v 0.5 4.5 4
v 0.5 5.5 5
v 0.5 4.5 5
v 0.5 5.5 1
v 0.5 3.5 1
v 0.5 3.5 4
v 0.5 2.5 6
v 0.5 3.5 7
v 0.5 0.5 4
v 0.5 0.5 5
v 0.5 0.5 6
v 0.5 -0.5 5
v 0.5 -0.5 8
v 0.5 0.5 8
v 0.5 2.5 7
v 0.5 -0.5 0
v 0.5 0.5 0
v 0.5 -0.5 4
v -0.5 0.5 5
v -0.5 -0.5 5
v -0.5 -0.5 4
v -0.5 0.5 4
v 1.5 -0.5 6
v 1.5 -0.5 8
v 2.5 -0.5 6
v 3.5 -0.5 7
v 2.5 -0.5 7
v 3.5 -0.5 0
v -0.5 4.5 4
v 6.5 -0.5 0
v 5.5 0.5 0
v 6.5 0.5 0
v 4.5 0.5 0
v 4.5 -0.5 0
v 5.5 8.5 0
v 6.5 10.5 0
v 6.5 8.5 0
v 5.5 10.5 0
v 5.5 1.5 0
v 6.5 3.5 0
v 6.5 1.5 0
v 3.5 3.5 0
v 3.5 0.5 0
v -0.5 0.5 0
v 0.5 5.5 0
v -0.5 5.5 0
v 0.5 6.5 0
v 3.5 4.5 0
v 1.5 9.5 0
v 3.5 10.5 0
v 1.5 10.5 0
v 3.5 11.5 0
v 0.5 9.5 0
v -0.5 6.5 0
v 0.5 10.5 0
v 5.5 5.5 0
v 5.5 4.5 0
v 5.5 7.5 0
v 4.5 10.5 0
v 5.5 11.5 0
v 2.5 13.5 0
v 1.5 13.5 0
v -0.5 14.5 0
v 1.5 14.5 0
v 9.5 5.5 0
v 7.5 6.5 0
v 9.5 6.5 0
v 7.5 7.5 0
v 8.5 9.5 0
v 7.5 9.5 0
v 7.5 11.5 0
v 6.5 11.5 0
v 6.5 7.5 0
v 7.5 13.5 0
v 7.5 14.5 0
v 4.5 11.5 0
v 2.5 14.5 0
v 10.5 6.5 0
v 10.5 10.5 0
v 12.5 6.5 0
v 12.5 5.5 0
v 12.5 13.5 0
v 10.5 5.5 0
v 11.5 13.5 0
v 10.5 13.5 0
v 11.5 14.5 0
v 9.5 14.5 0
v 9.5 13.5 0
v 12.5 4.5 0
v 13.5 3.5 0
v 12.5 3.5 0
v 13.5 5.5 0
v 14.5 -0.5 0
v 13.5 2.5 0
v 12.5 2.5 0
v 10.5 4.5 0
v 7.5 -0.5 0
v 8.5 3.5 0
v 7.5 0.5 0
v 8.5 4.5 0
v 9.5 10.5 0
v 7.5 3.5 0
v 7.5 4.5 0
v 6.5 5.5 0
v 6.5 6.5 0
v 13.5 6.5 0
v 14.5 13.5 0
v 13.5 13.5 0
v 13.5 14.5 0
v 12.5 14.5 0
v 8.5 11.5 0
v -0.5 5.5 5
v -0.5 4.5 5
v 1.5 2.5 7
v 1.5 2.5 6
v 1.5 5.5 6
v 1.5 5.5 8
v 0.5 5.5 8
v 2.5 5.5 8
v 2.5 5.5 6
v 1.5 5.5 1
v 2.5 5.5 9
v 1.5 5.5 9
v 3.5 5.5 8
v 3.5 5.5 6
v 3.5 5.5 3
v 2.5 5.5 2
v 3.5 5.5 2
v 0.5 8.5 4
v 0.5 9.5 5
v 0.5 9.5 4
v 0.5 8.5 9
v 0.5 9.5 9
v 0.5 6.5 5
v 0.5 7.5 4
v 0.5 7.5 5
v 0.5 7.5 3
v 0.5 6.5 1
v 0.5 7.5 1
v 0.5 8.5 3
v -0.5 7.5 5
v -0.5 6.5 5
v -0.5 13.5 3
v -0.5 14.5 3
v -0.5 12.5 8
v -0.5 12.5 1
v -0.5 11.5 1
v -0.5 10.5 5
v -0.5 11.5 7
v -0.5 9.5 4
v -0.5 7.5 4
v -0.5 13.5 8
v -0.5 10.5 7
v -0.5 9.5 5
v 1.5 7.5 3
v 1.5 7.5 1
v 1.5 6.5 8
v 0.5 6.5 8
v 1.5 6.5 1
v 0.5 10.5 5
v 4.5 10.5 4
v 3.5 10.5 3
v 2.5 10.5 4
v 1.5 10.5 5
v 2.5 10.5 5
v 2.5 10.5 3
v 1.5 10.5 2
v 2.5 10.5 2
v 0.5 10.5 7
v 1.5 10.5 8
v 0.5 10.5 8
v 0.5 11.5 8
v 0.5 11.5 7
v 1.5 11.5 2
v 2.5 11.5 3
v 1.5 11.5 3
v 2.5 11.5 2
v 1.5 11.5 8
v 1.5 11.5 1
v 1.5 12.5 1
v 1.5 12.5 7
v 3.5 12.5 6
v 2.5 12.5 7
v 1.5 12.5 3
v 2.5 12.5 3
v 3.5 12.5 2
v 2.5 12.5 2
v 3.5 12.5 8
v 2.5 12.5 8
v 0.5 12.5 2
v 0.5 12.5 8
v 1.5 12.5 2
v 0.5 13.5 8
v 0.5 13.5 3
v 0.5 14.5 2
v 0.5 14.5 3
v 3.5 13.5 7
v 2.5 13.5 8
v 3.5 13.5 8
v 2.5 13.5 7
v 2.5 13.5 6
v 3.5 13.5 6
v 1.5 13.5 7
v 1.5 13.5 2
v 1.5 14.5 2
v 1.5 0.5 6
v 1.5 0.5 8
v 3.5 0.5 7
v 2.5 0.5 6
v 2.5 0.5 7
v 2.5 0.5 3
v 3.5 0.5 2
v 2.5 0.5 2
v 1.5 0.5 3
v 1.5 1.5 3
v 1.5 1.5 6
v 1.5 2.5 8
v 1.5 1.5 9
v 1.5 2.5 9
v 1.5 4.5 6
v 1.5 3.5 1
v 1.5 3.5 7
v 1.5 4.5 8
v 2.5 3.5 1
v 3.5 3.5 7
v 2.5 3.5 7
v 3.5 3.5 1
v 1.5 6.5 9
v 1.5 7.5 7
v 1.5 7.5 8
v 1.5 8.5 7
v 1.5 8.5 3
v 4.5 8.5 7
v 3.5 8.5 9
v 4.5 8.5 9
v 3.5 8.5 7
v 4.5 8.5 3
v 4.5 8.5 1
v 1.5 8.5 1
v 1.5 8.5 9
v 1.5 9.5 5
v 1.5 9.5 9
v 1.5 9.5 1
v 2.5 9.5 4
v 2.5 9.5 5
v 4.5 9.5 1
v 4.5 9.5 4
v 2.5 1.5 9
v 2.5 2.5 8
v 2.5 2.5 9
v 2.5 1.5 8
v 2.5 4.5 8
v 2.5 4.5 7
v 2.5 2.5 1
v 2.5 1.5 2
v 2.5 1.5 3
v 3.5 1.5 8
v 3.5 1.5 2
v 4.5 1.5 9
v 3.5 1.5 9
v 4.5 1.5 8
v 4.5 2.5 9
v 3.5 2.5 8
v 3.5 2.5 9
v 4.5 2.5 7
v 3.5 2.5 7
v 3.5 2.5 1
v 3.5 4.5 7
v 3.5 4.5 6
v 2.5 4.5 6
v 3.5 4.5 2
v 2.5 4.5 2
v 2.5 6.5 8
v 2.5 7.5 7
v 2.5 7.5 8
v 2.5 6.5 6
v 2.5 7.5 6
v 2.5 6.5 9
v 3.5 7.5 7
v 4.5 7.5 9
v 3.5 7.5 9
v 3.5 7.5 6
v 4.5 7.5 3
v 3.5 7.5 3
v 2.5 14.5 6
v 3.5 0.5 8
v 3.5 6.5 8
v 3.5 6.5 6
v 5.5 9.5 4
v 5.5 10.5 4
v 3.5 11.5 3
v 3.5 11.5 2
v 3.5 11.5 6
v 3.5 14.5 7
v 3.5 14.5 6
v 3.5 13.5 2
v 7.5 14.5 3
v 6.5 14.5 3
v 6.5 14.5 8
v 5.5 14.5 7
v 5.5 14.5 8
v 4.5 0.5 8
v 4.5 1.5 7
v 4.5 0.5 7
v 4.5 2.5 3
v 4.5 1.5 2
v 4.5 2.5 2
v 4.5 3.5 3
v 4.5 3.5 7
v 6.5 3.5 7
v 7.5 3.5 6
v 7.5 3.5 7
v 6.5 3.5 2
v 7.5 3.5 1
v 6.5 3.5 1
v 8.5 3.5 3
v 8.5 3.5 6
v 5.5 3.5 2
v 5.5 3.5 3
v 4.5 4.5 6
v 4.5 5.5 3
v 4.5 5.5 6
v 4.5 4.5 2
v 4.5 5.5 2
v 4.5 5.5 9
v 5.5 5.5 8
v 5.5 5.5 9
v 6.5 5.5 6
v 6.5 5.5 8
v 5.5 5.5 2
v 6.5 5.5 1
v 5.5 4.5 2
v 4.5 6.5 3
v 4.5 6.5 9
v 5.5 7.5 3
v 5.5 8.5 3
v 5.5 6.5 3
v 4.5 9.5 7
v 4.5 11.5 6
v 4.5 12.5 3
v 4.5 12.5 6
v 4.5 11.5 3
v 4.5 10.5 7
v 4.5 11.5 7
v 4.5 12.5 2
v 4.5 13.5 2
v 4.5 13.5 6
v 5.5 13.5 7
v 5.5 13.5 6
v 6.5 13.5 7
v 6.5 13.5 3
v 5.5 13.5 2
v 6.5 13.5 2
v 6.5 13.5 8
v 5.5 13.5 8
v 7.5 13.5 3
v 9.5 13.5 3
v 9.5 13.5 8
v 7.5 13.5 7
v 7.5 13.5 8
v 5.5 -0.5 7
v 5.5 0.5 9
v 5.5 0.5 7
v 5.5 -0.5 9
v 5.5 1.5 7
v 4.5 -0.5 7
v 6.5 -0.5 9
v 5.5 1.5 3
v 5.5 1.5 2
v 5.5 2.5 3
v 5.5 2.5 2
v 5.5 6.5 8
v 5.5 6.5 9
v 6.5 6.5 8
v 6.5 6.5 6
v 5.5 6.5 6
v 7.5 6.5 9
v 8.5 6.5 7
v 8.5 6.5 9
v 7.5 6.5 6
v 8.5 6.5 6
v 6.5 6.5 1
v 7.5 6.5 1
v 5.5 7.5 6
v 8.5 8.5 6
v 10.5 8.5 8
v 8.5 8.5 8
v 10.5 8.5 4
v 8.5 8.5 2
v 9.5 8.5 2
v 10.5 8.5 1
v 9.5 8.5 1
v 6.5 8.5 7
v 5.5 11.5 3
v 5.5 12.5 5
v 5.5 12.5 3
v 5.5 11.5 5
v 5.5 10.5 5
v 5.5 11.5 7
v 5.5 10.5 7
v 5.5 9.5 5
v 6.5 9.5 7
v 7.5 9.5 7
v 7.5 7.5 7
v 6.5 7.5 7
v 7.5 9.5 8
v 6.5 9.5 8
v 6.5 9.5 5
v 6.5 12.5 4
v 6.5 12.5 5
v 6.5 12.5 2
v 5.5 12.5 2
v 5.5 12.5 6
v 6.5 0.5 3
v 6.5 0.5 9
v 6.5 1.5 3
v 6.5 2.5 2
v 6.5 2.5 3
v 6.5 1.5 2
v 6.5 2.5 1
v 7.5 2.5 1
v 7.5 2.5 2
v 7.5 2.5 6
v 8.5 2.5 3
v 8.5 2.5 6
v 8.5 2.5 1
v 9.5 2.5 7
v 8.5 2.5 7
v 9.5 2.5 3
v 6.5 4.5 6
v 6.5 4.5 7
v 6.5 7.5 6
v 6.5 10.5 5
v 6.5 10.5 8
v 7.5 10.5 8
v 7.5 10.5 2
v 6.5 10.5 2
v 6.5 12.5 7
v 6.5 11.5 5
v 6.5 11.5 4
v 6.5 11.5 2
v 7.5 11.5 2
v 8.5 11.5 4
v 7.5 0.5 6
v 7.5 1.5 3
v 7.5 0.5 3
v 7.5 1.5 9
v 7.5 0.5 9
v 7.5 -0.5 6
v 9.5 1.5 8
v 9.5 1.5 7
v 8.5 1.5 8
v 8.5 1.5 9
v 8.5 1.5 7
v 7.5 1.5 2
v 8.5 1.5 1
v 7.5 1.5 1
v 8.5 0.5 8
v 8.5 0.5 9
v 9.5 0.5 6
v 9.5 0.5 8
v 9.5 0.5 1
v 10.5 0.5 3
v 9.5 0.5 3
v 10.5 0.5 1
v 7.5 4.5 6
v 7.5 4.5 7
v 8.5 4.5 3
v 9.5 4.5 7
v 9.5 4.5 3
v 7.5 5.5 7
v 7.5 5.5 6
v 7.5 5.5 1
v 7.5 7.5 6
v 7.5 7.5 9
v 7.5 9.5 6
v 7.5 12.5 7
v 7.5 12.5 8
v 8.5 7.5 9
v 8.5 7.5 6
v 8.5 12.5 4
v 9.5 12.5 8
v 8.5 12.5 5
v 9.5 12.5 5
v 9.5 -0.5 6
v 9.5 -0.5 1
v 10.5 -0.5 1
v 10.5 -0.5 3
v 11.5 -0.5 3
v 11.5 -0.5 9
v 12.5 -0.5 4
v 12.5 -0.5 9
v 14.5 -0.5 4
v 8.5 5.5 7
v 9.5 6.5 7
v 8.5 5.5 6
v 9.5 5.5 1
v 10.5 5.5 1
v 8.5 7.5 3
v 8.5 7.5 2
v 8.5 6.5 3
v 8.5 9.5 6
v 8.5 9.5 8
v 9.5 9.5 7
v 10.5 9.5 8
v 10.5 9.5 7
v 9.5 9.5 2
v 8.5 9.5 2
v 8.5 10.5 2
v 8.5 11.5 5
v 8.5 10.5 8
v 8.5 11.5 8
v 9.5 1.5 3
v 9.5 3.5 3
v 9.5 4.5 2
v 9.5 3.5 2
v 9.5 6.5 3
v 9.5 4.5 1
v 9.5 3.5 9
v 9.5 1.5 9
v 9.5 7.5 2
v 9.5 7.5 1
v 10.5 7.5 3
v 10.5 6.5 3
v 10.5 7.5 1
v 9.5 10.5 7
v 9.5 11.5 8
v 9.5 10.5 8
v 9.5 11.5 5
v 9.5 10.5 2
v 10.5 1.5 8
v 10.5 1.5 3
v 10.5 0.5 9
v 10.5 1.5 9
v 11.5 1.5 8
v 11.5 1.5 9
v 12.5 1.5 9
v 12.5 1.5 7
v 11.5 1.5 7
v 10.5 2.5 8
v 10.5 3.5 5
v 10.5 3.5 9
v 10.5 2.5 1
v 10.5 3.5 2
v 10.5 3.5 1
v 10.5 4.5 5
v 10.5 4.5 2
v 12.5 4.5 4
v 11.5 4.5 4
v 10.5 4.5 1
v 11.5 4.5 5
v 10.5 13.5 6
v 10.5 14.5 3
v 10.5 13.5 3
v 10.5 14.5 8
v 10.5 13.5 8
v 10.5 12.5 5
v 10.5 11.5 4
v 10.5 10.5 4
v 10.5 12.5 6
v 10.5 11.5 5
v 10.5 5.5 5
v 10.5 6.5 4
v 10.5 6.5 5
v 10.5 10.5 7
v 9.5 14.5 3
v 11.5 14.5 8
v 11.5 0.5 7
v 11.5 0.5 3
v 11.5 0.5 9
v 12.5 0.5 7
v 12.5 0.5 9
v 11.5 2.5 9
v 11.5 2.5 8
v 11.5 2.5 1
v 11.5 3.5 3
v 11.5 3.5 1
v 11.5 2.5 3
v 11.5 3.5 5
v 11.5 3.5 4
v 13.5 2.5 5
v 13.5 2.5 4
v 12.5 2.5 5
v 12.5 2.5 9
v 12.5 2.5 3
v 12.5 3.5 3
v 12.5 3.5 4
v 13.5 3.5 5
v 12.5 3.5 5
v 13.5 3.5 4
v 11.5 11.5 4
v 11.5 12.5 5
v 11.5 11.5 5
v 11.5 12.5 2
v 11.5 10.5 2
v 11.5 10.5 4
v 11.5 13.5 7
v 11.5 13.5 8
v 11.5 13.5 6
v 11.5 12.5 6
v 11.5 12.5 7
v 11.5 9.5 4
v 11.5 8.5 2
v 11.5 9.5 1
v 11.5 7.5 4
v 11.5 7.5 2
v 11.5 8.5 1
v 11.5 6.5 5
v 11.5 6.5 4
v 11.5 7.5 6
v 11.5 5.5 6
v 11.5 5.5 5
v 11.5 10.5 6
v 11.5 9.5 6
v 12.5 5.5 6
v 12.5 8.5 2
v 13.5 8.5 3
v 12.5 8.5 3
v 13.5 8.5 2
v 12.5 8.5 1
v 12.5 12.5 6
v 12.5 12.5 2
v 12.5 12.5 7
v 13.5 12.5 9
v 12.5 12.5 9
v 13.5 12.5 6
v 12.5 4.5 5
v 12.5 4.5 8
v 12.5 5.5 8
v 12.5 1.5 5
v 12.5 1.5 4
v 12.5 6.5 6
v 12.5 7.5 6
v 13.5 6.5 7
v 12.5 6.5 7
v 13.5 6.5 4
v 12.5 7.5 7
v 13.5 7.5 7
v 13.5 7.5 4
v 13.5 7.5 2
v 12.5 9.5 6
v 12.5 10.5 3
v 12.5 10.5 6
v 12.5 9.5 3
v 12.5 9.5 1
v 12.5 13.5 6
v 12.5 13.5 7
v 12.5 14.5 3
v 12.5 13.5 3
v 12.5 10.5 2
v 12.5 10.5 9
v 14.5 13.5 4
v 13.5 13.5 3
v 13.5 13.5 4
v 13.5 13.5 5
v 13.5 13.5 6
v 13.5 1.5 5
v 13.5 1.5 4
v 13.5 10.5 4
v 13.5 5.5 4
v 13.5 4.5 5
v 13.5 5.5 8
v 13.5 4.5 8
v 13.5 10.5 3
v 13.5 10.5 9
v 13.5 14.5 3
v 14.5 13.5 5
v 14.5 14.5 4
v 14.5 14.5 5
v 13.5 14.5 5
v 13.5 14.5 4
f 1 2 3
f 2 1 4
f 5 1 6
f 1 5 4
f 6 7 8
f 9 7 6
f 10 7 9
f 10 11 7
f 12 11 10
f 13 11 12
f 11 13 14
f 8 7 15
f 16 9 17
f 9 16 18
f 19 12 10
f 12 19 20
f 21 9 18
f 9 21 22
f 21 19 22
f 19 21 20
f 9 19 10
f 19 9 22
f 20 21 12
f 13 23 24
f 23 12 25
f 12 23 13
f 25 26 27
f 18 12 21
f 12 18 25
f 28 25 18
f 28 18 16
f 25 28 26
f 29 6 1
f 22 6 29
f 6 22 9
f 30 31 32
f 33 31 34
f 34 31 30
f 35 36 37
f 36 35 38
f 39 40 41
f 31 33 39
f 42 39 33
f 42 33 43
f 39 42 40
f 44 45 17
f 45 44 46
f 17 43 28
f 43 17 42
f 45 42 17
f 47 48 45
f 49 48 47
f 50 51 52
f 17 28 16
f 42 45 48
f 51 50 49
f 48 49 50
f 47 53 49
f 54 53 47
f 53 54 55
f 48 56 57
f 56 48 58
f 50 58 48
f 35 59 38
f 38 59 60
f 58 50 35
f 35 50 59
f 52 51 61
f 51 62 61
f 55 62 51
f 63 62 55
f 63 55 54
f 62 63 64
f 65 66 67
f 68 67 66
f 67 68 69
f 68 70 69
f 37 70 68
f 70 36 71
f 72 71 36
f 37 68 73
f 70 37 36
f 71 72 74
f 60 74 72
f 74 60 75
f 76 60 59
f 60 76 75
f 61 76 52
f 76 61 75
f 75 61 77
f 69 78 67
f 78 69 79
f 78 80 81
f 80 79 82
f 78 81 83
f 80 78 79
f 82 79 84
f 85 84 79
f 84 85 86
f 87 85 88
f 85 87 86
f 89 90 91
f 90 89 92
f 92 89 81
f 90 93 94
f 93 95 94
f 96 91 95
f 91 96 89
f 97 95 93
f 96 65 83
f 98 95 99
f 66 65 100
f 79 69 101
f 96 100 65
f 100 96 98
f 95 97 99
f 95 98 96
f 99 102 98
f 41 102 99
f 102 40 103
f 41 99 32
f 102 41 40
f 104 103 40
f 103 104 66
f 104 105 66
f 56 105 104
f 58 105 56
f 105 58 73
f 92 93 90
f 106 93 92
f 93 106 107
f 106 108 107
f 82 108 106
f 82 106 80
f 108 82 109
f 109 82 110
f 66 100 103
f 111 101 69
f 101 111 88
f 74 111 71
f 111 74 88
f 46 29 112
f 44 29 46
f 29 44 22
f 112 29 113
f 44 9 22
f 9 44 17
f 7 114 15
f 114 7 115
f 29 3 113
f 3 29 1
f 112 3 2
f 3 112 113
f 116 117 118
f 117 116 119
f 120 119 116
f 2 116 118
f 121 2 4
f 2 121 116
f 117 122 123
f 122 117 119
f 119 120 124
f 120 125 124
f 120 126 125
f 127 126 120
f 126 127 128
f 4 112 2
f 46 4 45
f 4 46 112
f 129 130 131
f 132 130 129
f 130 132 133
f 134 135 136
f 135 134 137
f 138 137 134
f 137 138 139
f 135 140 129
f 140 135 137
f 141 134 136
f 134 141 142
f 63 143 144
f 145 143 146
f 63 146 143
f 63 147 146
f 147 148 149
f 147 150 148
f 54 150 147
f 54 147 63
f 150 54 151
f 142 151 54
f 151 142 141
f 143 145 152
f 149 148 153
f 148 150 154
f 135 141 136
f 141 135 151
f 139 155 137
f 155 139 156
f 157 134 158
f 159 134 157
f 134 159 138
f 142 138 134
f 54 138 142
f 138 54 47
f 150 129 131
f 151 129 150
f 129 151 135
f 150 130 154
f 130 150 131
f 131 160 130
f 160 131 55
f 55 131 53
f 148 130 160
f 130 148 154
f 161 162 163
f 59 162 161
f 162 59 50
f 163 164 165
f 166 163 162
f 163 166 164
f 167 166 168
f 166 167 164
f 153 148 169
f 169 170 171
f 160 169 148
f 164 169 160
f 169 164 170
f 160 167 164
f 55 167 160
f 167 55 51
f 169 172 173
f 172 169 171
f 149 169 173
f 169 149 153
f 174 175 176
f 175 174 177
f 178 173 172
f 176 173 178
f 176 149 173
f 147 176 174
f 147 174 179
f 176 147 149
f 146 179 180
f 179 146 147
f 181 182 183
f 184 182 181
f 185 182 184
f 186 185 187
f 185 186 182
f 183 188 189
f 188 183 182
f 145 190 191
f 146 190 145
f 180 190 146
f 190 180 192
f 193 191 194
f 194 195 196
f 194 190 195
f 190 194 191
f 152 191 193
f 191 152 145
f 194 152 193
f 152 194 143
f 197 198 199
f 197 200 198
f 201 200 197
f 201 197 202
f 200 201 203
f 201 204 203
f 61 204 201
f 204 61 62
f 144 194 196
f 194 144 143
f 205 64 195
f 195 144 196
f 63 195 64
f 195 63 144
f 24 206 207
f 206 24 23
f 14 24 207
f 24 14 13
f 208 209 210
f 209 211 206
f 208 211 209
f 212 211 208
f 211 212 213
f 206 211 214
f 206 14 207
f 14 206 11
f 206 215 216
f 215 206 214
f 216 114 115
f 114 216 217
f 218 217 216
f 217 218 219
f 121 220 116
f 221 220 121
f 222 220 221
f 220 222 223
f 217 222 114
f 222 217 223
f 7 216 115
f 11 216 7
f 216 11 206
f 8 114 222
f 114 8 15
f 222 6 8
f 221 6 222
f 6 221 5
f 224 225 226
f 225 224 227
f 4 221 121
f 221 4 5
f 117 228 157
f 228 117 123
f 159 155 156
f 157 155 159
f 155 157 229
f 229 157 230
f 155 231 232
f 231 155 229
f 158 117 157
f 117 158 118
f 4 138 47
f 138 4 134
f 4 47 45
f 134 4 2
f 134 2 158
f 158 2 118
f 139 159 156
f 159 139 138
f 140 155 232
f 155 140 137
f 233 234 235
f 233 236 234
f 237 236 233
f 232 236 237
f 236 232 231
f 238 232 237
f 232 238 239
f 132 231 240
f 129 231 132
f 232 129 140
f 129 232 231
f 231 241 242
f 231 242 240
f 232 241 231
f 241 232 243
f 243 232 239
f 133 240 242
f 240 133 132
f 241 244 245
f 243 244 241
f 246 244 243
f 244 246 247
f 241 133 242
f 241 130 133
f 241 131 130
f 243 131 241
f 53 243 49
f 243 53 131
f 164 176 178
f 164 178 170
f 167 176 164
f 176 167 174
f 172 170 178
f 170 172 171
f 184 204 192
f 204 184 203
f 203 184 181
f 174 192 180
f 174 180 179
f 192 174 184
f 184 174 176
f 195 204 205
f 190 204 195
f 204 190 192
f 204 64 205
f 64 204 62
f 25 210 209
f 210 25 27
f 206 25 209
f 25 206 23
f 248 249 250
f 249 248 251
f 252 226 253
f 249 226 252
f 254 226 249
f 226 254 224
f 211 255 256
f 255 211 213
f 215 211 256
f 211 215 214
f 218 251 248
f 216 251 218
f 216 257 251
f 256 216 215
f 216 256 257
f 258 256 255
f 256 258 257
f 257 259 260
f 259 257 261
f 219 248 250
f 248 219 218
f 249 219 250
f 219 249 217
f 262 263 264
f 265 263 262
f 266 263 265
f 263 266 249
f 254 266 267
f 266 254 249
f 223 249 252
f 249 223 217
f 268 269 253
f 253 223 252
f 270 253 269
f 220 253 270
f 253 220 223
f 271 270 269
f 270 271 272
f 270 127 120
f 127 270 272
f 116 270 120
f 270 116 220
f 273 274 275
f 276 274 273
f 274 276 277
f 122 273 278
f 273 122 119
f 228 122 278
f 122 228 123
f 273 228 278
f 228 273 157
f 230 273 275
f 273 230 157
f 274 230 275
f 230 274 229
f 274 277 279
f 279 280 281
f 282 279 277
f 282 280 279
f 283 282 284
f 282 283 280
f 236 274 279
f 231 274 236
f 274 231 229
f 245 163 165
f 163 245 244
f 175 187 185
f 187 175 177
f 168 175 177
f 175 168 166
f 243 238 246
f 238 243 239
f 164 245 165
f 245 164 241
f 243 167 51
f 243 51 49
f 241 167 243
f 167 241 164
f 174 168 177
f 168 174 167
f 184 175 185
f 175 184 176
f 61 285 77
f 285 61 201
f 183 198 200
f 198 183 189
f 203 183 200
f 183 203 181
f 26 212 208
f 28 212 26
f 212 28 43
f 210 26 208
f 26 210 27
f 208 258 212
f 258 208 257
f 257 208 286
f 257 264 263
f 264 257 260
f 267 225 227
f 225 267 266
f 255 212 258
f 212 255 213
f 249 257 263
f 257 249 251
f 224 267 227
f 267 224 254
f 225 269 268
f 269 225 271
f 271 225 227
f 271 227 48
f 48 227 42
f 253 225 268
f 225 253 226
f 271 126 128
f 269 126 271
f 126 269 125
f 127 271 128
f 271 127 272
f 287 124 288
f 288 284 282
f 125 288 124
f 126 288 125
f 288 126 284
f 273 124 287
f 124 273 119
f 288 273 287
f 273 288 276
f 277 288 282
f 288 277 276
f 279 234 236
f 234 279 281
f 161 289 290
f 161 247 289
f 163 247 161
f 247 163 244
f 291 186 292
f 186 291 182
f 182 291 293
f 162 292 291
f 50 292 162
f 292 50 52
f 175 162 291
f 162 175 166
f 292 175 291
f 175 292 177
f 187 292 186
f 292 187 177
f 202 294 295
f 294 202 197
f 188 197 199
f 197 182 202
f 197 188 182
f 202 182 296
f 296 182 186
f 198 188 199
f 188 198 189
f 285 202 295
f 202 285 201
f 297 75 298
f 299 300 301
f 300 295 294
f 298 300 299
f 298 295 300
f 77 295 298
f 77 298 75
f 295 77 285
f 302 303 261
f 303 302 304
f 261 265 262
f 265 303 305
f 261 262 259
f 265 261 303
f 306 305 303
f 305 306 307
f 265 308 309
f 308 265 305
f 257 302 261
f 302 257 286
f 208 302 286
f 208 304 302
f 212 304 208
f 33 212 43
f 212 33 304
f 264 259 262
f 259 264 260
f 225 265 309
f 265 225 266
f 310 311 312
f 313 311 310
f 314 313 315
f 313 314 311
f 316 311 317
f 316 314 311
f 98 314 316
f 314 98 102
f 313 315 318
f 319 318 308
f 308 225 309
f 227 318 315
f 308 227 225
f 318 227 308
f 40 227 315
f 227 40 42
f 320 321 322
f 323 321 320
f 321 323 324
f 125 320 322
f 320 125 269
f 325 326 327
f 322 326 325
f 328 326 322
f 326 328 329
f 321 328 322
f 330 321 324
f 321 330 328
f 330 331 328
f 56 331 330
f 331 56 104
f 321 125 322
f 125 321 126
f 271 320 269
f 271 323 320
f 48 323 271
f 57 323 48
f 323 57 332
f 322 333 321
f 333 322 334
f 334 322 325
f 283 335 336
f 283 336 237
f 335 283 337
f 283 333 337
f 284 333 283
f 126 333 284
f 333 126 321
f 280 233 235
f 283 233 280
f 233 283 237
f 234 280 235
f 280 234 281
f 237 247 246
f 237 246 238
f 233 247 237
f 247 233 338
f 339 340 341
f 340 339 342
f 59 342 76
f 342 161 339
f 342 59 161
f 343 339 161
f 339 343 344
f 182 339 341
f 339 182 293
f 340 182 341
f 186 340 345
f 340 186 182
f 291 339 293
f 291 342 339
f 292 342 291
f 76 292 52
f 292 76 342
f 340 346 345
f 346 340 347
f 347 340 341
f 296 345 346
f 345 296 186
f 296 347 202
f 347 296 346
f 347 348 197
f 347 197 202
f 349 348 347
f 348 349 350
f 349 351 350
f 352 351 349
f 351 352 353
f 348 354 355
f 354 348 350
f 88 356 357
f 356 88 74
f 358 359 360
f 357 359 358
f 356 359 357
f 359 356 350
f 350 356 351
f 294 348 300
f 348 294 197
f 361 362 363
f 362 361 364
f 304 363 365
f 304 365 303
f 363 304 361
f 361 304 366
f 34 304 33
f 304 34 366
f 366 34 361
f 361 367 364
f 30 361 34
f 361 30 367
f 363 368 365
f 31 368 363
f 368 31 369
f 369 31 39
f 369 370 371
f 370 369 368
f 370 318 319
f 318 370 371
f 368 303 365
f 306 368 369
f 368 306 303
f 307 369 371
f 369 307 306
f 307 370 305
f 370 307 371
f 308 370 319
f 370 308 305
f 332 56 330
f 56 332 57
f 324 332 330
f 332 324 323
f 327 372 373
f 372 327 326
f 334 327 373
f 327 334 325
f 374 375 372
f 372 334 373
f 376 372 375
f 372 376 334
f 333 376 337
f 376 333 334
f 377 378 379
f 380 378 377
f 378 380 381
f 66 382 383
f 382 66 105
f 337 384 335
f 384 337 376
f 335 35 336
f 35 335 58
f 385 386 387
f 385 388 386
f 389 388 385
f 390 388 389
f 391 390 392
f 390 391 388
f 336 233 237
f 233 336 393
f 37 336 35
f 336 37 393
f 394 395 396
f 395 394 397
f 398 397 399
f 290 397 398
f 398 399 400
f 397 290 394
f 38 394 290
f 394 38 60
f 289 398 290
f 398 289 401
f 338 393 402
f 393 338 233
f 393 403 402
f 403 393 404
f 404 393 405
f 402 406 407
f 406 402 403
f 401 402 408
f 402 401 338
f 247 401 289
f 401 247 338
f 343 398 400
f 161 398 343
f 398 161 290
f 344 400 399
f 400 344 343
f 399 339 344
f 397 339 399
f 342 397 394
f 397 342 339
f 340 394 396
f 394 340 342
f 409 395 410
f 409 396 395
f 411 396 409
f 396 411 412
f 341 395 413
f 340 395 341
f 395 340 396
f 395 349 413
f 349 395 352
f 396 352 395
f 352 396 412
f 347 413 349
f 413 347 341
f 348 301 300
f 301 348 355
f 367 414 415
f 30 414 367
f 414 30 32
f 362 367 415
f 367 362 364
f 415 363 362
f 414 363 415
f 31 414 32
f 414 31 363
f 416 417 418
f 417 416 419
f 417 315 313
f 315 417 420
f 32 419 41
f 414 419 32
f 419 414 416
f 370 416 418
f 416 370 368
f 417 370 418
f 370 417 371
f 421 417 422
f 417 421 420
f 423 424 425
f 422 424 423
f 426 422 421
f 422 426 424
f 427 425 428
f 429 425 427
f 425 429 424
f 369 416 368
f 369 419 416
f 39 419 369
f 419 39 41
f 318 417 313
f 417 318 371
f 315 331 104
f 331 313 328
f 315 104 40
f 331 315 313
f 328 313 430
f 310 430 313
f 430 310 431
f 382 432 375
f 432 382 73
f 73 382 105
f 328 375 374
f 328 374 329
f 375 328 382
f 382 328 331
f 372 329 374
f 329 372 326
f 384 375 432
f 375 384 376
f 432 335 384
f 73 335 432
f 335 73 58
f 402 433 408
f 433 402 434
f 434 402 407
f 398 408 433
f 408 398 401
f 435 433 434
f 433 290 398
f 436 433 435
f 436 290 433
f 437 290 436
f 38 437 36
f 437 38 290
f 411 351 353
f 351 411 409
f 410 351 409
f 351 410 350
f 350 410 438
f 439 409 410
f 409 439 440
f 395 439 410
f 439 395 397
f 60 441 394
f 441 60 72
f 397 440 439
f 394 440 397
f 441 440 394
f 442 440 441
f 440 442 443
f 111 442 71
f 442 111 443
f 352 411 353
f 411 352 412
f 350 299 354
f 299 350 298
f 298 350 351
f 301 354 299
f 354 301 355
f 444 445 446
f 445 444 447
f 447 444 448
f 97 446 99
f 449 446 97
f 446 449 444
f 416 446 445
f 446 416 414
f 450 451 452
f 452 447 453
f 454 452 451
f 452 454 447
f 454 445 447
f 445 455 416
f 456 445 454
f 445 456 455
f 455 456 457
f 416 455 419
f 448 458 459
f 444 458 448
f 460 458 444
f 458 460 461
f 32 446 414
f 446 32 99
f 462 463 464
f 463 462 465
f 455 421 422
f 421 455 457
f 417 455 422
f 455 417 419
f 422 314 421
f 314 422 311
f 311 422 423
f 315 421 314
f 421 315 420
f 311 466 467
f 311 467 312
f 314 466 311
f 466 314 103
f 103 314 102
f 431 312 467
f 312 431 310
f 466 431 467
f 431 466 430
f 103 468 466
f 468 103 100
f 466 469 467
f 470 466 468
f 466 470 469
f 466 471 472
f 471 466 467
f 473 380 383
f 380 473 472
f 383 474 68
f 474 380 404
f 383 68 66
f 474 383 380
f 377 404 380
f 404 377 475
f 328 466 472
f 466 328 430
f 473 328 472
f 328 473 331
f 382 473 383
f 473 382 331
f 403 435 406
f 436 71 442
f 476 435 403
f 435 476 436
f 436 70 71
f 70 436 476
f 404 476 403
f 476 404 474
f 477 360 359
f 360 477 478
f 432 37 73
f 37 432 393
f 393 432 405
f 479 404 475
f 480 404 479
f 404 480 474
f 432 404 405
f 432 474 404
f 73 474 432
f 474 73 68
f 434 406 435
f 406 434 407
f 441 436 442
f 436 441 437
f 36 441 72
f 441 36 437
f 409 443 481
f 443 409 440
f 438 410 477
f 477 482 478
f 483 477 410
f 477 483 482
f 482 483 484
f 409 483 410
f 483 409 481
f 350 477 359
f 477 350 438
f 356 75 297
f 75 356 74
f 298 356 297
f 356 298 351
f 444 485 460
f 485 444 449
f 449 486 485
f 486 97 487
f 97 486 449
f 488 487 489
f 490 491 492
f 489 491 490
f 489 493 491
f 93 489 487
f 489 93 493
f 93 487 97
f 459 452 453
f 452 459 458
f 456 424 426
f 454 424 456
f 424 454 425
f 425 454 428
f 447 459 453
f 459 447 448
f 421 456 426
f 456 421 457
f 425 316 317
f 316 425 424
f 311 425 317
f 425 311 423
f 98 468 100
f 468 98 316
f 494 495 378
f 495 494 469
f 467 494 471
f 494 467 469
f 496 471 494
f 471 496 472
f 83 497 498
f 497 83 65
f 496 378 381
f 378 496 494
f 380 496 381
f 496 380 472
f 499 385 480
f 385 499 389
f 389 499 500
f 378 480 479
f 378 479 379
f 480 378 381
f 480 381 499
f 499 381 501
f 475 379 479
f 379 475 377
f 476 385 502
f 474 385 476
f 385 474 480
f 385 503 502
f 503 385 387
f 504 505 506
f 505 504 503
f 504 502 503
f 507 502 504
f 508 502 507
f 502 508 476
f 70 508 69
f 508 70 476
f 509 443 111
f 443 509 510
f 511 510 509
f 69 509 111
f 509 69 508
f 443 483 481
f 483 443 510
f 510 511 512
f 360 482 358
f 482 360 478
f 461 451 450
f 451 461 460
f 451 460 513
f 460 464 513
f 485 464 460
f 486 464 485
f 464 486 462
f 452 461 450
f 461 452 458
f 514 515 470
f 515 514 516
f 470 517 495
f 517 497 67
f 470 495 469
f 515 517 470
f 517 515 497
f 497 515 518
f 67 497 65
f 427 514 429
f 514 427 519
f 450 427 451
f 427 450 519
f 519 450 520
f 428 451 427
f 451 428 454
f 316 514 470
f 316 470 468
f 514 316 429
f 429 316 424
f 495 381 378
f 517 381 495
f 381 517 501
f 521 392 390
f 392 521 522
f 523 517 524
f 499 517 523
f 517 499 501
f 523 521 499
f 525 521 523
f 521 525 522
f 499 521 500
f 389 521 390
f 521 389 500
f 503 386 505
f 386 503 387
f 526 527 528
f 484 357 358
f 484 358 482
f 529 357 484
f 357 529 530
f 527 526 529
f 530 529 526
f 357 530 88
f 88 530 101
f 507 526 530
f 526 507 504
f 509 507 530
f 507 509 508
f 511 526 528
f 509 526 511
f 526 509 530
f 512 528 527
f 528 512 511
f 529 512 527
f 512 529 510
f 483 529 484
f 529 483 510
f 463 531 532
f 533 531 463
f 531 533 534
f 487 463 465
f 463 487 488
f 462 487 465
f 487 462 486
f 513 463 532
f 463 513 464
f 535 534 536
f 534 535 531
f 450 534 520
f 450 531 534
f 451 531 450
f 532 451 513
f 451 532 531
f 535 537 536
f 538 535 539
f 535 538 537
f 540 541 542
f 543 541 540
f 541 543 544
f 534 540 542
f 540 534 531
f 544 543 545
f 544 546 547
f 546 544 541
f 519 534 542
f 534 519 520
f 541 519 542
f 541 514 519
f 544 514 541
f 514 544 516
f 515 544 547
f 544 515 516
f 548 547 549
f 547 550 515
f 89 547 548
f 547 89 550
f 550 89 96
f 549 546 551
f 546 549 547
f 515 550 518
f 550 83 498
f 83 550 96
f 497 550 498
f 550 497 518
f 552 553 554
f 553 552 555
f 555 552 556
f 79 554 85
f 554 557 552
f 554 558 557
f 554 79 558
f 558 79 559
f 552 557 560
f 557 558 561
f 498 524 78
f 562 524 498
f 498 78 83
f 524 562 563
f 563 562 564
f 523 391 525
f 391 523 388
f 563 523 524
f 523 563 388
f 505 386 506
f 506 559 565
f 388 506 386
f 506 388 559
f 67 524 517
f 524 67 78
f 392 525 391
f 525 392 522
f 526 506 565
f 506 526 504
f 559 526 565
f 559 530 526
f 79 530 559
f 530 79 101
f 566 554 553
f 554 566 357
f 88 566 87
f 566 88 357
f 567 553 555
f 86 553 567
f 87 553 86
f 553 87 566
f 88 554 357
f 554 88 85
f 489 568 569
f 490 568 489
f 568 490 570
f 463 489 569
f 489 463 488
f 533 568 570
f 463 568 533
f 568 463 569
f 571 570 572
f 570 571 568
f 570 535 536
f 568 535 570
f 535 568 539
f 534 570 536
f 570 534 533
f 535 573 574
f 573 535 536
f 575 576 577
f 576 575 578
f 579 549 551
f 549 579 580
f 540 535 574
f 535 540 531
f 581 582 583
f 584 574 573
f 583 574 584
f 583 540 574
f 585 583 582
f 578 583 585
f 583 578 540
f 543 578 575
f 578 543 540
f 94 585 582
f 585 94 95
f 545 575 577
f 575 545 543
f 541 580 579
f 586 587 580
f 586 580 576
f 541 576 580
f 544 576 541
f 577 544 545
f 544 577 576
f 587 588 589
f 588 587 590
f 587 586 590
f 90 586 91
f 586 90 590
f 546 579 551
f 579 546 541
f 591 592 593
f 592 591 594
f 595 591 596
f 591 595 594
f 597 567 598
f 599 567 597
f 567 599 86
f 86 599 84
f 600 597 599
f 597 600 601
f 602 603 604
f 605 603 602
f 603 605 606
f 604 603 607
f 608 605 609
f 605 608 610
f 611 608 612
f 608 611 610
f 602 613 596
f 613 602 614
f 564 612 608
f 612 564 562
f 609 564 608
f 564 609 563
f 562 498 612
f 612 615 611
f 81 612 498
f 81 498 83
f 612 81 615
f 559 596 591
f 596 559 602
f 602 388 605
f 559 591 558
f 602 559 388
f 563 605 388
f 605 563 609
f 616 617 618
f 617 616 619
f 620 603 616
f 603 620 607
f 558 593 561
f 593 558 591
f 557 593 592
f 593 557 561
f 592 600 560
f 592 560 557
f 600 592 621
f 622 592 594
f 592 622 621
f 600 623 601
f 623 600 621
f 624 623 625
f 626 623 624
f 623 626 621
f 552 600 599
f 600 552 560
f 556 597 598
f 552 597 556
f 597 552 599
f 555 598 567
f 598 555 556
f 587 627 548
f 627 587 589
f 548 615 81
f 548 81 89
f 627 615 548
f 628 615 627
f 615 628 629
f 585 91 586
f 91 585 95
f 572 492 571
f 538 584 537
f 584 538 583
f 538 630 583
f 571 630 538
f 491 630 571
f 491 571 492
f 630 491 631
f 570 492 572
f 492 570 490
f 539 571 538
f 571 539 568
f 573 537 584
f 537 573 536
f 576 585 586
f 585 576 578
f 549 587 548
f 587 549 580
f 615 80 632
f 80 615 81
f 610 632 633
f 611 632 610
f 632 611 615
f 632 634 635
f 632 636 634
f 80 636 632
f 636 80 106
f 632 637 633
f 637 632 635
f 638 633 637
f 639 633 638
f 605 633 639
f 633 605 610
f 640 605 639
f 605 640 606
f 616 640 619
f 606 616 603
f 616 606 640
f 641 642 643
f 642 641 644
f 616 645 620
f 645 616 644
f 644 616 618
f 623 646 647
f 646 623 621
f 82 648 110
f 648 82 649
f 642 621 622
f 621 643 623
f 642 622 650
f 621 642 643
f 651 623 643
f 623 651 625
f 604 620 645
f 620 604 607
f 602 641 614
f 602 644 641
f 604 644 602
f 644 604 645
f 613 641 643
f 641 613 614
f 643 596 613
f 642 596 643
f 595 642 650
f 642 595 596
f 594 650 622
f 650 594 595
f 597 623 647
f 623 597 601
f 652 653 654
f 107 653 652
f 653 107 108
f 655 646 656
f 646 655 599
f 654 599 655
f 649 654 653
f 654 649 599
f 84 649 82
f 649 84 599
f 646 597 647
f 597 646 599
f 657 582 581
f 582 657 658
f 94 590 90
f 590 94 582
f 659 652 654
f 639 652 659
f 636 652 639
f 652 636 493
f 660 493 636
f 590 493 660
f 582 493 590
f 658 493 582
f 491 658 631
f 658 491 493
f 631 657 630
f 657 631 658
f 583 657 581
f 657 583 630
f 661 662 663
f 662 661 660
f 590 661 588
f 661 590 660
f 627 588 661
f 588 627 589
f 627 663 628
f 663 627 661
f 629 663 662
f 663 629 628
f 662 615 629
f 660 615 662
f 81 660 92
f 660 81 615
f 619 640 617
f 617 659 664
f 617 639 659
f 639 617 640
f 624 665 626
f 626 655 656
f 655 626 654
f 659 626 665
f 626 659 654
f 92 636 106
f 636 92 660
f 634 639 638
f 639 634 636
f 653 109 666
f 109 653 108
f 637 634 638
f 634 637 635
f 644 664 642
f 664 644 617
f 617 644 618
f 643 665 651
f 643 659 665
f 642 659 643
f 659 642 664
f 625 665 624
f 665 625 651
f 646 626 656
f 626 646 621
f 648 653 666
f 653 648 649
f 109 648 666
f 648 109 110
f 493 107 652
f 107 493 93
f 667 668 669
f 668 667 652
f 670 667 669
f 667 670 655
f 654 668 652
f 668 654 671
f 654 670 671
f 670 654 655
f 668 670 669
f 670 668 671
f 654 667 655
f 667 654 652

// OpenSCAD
union() {
    translate([0, 0, 4.5]) color([1, 0, 0]) cube([1, 1, 1], center=true);
    translate([0, 1, 2.0]) cube([1, 1, 4], center=true);
    translate([0, 2, 2.0]) cube([1, 1, 4], center=true);
    translate([0, 3, 2.0]) cube([1, 1, 4], center=true);
    translate([0, 4, 2.0]) cube([1, 1, 4], center=true);
    translate([0, 5, 2.5]) cube([1, 1, 5], center=true);
    translate([0, 7, 2.5]) cube([1, 1, 5], center=true);
    translate([0, 8, 2.0]) cube([1, 1, 4], center=true);
    translate([0, 9, 2.0]) cube([1, 1, 4], center=true);
    translate([0, 10, 2.5]) cube([1, 1, 5], center=true);
    translate([0, 11, 3.5]) cube([1, 1, 7], center=true);
    translate([0, 12, 0.5]) cube([1, 1, 1], center=true);
    translate([0, 13, 4.0]) cube([1, 1, 8], center=true);
    translate([0, 14, 1.5]) cube([1, 1, 3], center=true);
    translate([1, 0, 4.0]) cube([1, 1, 8], center=true);
    translate([1, 1, 3.0]) cube([1, 1, 6], center=true);
    translate([1, 2, 3.0]) cube([1, 1, 6], center=true);
    translate([1, 3, 3.5]) cube([1, 1, 7], center=true);
    translate([1, 4, 0.5]) cube([1, 1, 1], center=true);
    translate([1, 5, 0.5]) cube([1, 1, 1], center=true);
    translate([1, 6, 4.0]) cube([1, 1, 8], center=true);
    translate([1, 7, 0.5]) cube([1, 1, 1], center=true);
    translate([1, 8, 1.5]) cube([1, 1, 3], center=true);
    translate([1, 9, 4.5]) cube([1, 1, 9], center=true);
    translate([1, 11, 4.0]) cube([1, 1, 8], center=true);
    translate([1, 12, 0.5]) cube([1, 1, 1], center=true);
    translate([1, 13, 1.0]) cube([1, 1, 2], center=true);
    translate([1, 14, 1.0]) cube([1, 1, 2], center=true);
    translate([2, 0, 3.0]) cube([1, 1, 6], center=true);
    translate([2, 1, 1.5]) cube([1, 1, 3], center=true);
    translate([2, 2, 4.5]) cube([1, 1, 9], center=true);
    translate([2, 3, 4.0]) cube([1, 1, 8], center=true);
    translate([2, 4, 4.0]) cube([1, 1, 8], center=true);
    translate([2, 5, 3.0]) cube([1, 1, 6], center=true);
    translate([2, 6, 4.5]) cube([1, 1, 9], center=true);
    translate([2, 7, 4.0]) cube([1, 1, 8], center=true);
    translate([2, 8, 3.5]) cube([1, 1, 7], center=true);
    translate([2, 9, 0.5]) cube([1, 1, 1], center=true);
    translate([2, 10, 2.5]) cube([1, 1, 5], center=true);
    translate([2, 11, 1.0]) cube([1, 1, 2], center=true);
    translate([2, 12, 1.5]) cube([1, 1, 3], center=true);
    translate([2, 13, 3.5]) cube([1, 1, 7], center=true);
    translate([3, 0, 3.5]) cube([1, 1, 7], center=true);
    translate([3, 1, 1.0]) cube([1, 1, 2], center=true);
    translate([3, 2, 4.0]) cube([1, 1, 8], center=true);
    translate([3, 3, 0.5]) cube([1, 1, 1], center=true);
    translate([3, 4, 3.5]) cube([1, 1, 7], center=true);
    translate([3, 5, 1.0]) cube([1, 1, 2], center=true);
    translate([3, 6, 4.0]) cube([1, 1, 8], center=true);
    translate([3, 7, 3.0]) cube([1, 1, 6], center=true);
    translate([3, 8, 3.5]) cube([1, 1, 7], center=true);
    translate([3, 9, 0.5]) cube([1, 1, 1], center=true);
    translate([3, 10, 2.0]) cube([1, 1, 4], center=true);
    translate([3, 11, 1.5]) cube([1, 1, 3], center=true);
    translate([3, 12, 1.0]) cube([1, 1, 2], center=true);
    translate([3, 13, 4.0]) cube([1, 1, 8], center=true);
    translate([3, 14, 3.0]) cube([1, 1, 6], center=true);
    translate([4, 1, 4.0]) cube([1, 1, 8], center=true);
    translate([4, 2, 4.5]) cube([1, 1, 9], center=true);
    translate([4, 3, 3.5]) cube([1, 1, 7], center=true);
    translate([4, 5, 3.0]) cube([1, 1, 6], center=true);
    translate([4, 6, 1.5]) cube([1, 1, 3], center=true);
    translate([4, 7, 1.5]) cube([1, 1, 3], center=true);
    translate([4, 8, 4.5]) cube([1, 1, 9], center=true);
    translate([4, 9, 0.5]) cube([1, 1, 1], center=true);
    translate([4, 10, 2.0]) cube([1, 1, 4], center=true);
    translate([4, 12, 3.0]) cube([1, 1, 6], center=true);
    translate([4, 13, 1.0]) cube([1, 1, 2], center=true);
    translate([4, 14, 3.5]) cube([1, 1, 7], center=true);
    translate([5, 0, 3.5]) cube([1, 1, 7], center=true);
    translate([5, 1, 3.5]) cube([1, 1, 7], center=true);
    translate([5, 2, 1.0]) cube([1, 1, 2], center=true);
    translate([5, 3, 1.5]) cube([1, 1, 3], center=true);
    translate([5, 5, 1.0]) cube([1, 1, 2], center=true);
    translate([5, 6, 4.5]) cube([1, 1, 9], center=true);
    translate([5, 7, 1.5]) cube([1, 1, 3], center=true);
    translate([5, 8, 1.5]) cube([1, 1, 3], center=true);
    translate([5, 9, 3.5]) cube([1, 1, 7], center=true);
    translate([5, 10, 2.0]) cube([1, 1, 4], center=true);
    translate([5, 11, 3.5]) cube([1, 1, 7], center=true);
    translate([5, 12, 1.5]) cube([1, 1, 3], center=true);
    translate([5, 13, 3.0]) cube([1, 1, 6], center=true);
    translate([5, 14, 3.5]) cube([1, 1, 7], center=true);
    translate([6, 0, 4.5]) cube([1, 1, 9], center=true);
    translate([6, 2, 1.5]) cube([1, 1, 3], center=true);
    translate([6, 3, 1.0]) cube([1, 1, 2], center=true);
    translate([6, 6, 4.0]) cube([1, 1, 8], center=true);
    translate([6, 7, 3.0]) cube([1, 1, 6], center=true);
    translate([6, 9, 3.5]) cube([1, 1, 7], center=true);
    translate([6, 10, 2.5]) cube([1, 1, 5], center=true);
    translate([6, 12, 2.5]) cube([1, 1, 5], center=true);
    translate([6, 13, 1.0]) cube([1, 1, 2], center=true);
    translate([6, 14, 4.0]) cube([1, 1, 8], center=true);
    translate([7, 1, 1.5]) cube([1, 1, 3], center=true);
    translate([7, 2, 1.0]) cube([1, 1, 2], center=true);
    translate([7, 3, 0.5]) cube([1, 1, 1], center=true);
    translate([7, 4, 3.5]) cube([1, 1, 7], center=true);
    translate([7, 5, 3.0]) cube([1, 1, 6], center=true);
    translate([7, 6, 0.5]) cube([1, 1, 1], center=true);
    translate([7, 8, 3.5]) cube([1, 1, 7], center=true);
    translate([7, 9, 3.5]) cube([1, 1, 7], center=true);
    translate([7, 10, 4.0]) cube([1, 1, 8], center=true);
    translate([7, 11, 1.0]) cube([1, 1, 2], center=true);
    translate([7, 12, 2.0]) cube([1, 1, 4], center=true);
    translate([7, 13, 3.5]) cube([1, 1, 7], center=true);
    translate([7, 14, 1.5]) cube([1, 1, 3], center=true);
    translate([8, 0, 3.0]) cube([1, 1, 6], center=true);
    translate([8, 1, 4.5]) cube([1, 1, 9], center=true);
    translate([8, 2, 0.5]) cube([1, 1, 1], center=true);
    translate([8, 3, 3.0]) cube([1, 1, 6], center=true);
    translate([8, 5, 3.5]) cube([1, 1, 7], center=true);
    translate([8, 6, 3.0]) cube([1, 1, 6], center=true);
    translate([8, 7, 4.5]) cube([1, 1, 9], center=true);
    translate([8, 8, 3.0]) cube([1, 1, 6], center=true);
    translate([8, 9, 3.0]) cube([1, 1, 6], center=true);
    translate([8, 12, 2.0]) cube([1, 1, 4], center=true);
    translate([8, 13, 4.0]) cube([1, 1, 8], center=true);
    translate([9, 0, 3.0]) cube([1, 1, 6], center=true);
    translate([9, 1, 4.0]) cube([1, 1, 8], center=true);
    translate([9, 2, 3.5]) cube([1, 1, 7], center=true);
    translate([9, 3, 1.5]) cube([1, 1, 3], center=true);
    translate([9, 4, 1.5]) cube([1, 1, 3], center=true);
    translate([9, 5, 3.5]) cube([1, 1, 7], center=true);
    translate([9, 6, 3.5]) cube([1, 1, 7], center=true);
    translate([9, 7, 1.5]) cube([1, 1, 3], center=true);
    translate([9, 8, 1.0]) cube([1, 1, 2], center=true);
    translate([9, 9, 4.0]) cube([1, 1, 8], center=true);
    translate([9, 10, 1.0]) cube([1, 1, 2], center=true);
    translate([9, 11, 4.0]) cube([1, 1, 8], center=true);
    translate([9, 12, 2.5]) cube([1, 1, 5], center=true);
    translate([9, 13, 4.0]) cube([1, 1, 8], center=true);
    translate([10, 0, 0.5]) cube([1, 1, 1], center=true);
    translate([10, 1, 1.5]) cube([1, 1, 3], center=true);
    translate([10, 2, 4.5]) cube([1, 1, 9], center=true);
    translate([10, 3, 4.5]) cube([1, 1, 9], center=true);
    translate([10, 4, 1.0]) cube([1, 1, 2], center=true);
    translate([10, 5, 0.5]) cube([1, 1, 1], center=true);
    translate([10, 7, 1.5]) cube([1, 1, 3], center=true);
    translate([10, 8, 0.5]) cube([1, 1, 1], center=true);
    translate([10, 9, 4.0]) cube([1, 1, 8], center=true);
    translate([10, 10, 3.5]) cube([1, 1, 7], center=true);
    translate([10, 14, 1.5]) cube([1, 1, 3], center=true);
    translate([11, 0, 1.5]) cube([1, 1, 3], center=true);
    translate([11, 1, 4.5]) cube([1, 1, 9], center=true);
    translate([11, 2, 4.0]) cube([1, 1, 8], center=true);
    translate([11, 3, 0.5]) cube([1, 1, 1], center=true);
    translate([11, 4, 2.5]) cube([1, 1, 5], center=true);
    translate([11, 6, 2.5]) cube([1, 1, 5], center=true);
    translate([11, 7, 2.0]) cube([1, 1, 4], center=true);
    translate([11, 8, 2.0]) cube([1, 1, 4], center=true);
    translate([11, 9, 2.0]) cube([1, 1, 4], center=true);
    translate([11, 10, 2.0]) cube([1, 1, 4], center=true);
    translate([11, 11, 2.0]) cube([1, 1, 4], center=true);
    translate([11, 12, 2.5]) cube([1, 1, 5], center=true);
    translate([11, 13, 3.0]) cube([1, 1, 6], center=true);
    translate([11, 14, 4.0]) cube([1, 1, 8], center=true);
    translate([12, 0, 4.5]) cube([1, 1, 9], center=true);
    translate([12, 1, 3.5]) cube([1, 1, 7], center=true);
    translate([12, 2, 4.5]) cube([1, 1, 9], center=true);
    translate([12, 3, 1.5]) cube([1, 1, 3], center=true);
    translate([12, 4, 2.0]) cube([1, 1, 4], center=true);
    translate([12, 6, 3.0]) cube([1, 1, 6], center=true);
    translate([12, 7, 3.0]) cube([1, 1, 6], center=true);
    translate([12, 8, 1.0]) cube([1, 1, 2], center=true);
    translate([12, 9, 0.5]) cube([1, 1, 1], center=true);
    translate([12, 10, 3.0]) cube([1, 1, 6], center=true);
    translate([12, 11, 1.0]) cube([1, 1, 2], center=true);
    translate([12, 12, 1.0]) cube([1, 1, 2], center=true);
    translate([12, 13, 3.5]) cube([1, 1, 7], center=true);
    translate([13, 0, 2.0]) cube([1, 1, 4], center=true);
    translate([13, 1, 2.0]) cube([1, 1, 4], center=true);
    translate([13, 2, 2.5]) cube([1, 1, 5], center=true);
    translate([13, 4, 2.5]) cube([1, 1, 5], center=true);
    translate([13, 5, 4.0]) cube([1, 1, 8], center=true);
    translate([13, 7, 3.5]) cube([1, 1, 7], center=true);
    translate([13, 8, 1.0]) cube([1, 1, 2], center=true);
    translate([13, 9, 1.5]) cube([1, 1, 3], center=true);
    translate([13, 10, 1.5]) cube([1, 1, 3], center=true);
    translate([13, 11, 4.5]) cube([1, 1, 9], center=true);
    translate([13, 12, 4.5]) cube([1, 1, 9], center=true);
    translate([13, 13, 3.0]) cube([1, 1, 6], center=true);
    translate([13, 14, 1.5]) cube([1, 1, 3], center=true);
    translate([14, 0, 2.0]) cube([1, 1, 4], center=true);
    translate([14, 1, 2.0]) cube([1, 1, 4], center=true);
    translate([14, 2, 2.0]) cube([1, 1, 4], center=true);
    translate([14, 3, 2.0]) cube([1, 1, 4], center=true);
    translate([14, 4, 2.0]) cube([1, 1, 4], center=true);
    translate([14, 5, 2.0]) cube([1, 1, 4], center=true);
    translate([14, 6, 2.0]) cube([1, 1, 4], center=true);
    translate([14, 7, 2.0]) cube([1, 1, 4], center=true);
    translate([14, 8, 2.0]) cube([1, 1, 4], center=true);
    translate([14, 9, 2.0]) cube([1, 1, 4], center=true);
    translate([14, 10, 2.0]) cube([1, 1, 4], center=true);
    translate([14, 11, 2.0]) cube([1, 1, 4], center=true);
    translate([14, 12, 2.0]) cube([1, 1, 4], center=true);
    translate([14, 13, 2.0]) cube([1, 1, 4], center=true);
    translate([14, 14, 4.5]) color([0, 0, 1]) cube([1, 1, 1], center=true);
}
